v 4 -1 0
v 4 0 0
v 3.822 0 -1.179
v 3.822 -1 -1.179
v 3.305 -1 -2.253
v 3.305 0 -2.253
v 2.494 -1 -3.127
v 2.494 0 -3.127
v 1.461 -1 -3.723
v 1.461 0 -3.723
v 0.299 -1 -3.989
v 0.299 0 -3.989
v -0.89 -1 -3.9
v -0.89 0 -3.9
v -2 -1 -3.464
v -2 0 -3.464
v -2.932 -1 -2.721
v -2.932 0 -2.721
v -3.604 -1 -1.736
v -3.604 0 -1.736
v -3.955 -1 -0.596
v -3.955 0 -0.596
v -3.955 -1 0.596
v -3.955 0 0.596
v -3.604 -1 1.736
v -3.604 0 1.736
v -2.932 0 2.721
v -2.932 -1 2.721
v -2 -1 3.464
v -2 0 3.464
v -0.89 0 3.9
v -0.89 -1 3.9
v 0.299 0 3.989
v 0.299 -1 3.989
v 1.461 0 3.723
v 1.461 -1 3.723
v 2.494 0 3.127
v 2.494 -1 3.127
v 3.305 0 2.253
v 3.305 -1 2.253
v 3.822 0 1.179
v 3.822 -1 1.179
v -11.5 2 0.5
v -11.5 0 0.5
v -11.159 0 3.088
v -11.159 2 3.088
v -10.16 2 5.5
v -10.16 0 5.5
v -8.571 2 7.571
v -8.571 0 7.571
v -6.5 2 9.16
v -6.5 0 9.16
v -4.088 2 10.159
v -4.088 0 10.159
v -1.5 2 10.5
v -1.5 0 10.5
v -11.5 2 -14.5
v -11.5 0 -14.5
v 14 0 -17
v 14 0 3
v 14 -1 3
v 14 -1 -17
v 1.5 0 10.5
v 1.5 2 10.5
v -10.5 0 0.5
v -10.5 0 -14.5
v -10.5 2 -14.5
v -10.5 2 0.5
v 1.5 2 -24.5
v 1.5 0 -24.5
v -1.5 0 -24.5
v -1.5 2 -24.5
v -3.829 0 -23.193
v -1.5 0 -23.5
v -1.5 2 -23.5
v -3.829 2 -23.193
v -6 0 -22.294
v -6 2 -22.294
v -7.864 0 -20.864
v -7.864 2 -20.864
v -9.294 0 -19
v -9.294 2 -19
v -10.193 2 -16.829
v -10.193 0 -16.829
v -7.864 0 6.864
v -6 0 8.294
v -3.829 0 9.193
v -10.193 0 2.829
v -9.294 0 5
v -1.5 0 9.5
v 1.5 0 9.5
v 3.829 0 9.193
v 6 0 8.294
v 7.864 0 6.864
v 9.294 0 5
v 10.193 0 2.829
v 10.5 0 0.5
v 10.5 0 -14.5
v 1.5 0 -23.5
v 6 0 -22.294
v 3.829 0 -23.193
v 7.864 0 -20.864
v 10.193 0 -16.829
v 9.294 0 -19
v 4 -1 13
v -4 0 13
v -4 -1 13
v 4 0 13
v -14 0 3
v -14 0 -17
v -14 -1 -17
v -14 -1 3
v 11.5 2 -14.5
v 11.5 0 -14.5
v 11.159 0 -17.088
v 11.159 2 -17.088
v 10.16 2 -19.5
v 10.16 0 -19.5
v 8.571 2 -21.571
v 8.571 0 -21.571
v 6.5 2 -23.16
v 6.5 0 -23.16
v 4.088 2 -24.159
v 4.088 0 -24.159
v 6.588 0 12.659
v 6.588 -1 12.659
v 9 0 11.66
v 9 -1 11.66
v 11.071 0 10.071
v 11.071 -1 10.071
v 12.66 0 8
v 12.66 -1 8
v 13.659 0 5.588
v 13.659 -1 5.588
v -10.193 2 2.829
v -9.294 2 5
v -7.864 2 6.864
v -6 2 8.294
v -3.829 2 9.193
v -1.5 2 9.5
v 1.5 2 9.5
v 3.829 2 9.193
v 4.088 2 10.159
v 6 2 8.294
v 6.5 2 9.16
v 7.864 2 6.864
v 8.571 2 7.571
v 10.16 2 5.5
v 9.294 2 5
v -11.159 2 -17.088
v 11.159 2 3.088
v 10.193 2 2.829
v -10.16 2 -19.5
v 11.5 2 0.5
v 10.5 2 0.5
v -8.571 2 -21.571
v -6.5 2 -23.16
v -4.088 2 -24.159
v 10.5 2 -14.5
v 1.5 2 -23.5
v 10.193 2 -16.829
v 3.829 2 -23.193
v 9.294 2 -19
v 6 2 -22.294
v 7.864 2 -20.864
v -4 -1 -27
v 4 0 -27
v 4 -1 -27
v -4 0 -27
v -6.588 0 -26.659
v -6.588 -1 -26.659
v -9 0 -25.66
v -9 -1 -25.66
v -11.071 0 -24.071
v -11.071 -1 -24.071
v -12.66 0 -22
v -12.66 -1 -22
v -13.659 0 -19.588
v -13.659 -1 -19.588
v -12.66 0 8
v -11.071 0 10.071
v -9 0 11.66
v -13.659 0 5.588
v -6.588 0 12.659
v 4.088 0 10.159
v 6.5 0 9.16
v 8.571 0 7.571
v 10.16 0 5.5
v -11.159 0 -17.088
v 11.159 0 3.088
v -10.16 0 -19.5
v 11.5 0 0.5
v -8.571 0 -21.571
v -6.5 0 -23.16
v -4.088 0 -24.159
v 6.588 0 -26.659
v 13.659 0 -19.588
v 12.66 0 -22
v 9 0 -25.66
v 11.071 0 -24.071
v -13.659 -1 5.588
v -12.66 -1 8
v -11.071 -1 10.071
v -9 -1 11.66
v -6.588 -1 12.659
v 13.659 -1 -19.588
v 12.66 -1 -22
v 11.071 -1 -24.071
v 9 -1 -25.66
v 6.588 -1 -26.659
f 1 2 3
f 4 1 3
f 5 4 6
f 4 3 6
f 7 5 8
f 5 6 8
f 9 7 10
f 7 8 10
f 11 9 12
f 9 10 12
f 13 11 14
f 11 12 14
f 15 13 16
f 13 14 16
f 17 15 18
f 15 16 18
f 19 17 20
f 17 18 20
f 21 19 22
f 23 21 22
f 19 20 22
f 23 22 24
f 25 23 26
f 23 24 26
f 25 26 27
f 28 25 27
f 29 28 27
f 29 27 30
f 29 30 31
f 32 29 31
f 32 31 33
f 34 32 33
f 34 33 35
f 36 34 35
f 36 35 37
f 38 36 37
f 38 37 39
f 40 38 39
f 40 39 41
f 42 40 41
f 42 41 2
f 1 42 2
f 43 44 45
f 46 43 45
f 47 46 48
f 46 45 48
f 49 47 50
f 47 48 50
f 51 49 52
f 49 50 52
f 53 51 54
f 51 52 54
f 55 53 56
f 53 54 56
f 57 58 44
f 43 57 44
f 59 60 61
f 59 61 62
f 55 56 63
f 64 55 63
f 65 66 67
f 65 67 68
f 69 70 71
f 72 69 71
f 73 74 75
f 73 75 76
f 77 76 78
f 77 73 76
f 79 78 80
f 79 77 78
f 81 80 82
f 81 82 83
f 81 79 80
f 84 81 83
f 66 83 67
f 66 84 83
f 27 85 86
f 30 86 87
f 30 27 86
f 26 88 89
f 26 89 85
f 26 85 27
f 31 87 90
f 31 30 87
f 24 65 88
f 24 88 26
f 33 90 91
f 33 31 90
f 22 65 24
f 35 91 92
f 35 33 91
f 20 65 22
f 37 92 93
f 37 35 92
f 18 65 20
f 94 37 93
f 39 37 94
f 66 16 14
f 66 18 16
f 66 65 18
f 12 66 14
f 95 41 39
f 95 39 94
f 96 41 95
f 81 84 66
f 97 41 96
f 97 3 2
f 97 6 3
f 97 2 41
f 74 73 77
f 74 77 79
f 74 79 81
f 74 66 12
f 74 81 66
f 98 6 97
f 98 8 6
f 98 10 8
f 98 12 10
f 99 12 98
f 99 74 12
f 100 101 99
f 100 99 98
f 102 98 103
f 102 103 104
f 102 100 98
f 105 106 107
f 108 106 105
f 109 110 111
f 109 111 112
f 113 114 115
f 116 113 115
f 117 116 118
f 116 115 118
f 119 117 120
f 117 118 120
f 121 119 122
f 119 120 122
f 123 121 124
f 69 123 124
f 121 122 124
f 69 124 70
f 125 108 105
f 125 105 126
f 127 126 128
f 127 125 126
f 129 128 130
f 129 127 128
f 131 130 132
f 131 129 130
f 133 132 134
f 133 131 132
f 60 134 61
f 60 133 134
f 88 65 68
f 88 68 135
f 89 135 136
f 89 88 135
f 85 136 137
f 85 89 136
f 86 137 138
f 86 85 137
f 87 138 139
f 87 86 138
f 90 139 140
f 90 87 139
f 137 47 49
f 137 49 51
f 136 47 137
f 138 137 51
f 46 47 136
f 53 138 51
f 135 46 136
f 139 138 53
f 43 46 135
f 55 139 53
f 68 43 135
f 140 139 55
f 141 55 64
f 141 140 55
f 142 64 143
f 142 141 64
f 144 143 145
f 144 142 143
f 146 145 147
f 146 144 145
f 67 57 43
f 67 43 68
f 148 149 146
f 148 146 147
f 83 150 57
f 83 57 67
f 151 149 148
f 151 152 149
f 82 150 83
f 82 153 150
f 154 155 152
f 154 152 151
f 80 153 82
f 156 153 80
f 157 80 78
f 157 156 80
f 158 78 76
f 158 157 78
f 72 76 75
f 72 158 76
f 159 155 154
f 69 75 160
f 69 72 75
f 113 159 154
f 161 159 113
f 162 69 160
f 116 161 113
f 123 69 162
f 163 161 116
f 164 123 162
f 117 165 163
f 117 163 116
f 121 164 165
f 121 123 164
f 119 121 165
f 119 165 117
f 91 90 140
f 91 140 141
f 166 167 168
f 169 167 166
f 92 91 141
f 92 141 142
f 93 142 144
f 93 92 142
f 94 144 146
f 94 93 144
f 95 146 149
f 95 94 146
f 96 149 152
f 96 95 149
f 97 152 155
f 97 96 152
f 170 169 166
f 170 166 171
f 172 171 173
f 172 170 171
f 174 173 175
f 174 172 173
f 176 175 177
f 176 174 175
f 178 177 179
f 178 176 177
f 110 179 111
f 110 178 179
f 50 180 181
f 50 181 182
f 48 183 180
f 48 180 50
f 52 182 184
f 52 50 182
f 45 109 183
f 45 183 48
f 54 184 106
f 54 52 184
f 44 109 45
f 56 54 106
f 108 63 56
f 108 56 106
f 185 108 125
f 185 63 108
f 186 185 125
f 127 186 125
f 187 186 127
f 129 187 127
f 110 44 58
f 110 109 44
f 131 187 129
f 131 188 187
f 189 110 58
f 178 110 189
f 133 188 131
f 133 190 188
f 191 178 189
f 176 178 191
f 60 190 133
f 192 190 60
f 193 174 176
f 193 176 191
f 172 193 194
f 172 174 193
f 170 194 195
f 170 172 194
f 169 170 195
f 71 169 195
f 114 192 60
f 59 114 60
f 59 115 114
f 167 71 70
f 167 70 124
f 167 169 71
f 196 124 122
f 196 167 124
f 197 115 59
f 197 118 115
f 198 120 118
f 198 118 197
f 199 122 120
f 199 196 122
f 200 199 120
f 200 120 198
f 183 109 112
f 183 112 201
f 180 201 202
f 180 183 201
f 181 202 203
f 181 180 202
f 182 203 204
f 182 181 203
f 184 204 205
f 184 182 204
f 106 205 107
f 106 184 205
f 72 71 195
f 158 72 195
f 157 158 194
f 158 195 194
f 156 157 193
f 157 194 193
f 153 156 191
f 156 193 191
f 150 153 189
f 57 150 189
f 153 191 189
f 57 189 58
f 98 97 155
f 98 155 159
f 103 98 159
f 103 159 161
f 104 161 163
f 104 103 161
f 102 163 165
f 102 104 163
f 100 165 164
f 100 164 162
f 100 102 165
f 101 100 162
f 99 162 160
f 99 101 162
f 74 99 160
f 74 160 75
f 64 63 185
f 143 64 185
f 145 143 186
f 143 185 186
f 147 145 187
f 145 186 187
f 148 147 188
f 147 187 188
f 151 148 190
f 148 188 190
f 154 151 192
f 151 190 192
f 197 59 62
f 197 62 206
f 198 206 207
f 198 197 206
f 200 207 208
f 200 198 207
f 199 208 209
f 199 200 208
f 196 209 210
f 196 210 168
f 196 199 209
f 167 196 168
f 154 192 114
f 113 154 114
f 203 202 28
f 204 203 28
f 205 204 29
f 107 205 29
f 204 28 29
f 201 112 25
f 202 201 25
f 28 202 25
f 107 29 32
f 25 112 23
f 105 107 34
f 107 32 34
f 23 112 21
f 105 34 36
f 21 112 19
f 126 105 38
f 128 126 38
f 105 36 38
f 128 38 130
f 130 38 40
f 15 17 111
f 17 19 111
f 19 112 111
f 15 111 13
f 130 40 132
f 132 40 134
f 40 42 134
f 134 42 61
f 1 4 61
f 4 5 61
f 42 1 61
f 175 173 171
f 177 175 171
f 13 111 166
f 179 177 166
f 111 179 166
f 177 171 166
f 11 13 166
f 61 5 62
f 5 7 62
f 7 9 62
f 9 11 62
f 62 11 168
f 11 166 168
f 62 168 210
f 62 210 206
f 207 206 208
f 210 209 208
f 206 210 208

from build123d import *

# Parameters (mm, degrees)
BOSS_EXTRUDE1_DEPTH     = 2
BOSS_EXTRUDE3_DEPTH     = 1
SKETCH2_R               = 4
CUT_EXTRUDE1_DEPTH      = 3
CUT_EXTRUDE1_DEPTH_BACK = 2


with BuildPart() as part:
    # Sketch1 → Boss-Extrude1 (new body)
    with BuildSketch(Plane(origin=(0, 0, 0), x_dir=(1, 0, 0), z_dir=(0, 1, 0))):
        with BuildLine():
            Line((-11.5, 14.5), (-11.5, -0.5))
            ThreePointArc((-11.5, -0.5), (-8.571067812, -7.571067812), (-1.5, -10.5))
            Line((-1.5, -10.5), (1.5, -10.5))
            ThreePointArc((1.5, -10.5), (8.571067812, -7.571067812), (11.5, -0.5))
            Line((11.5, -0.5), (11.5, 14.5))
            ThreePointArc((11.5, 14.5), (8.571067812, 21.571067812), (1.5, 24.5))
            Line((1.5, 24.5), (-1.5, 24.5))
            ThreePointArc((-1.5, 24.5), (-8.571067812, 21.571067812), (-11.5, 14.5))
        make_face()
        with BuildLine():
            ThreePointArc((-1.5, 23.5), (-7.863961031, 20.863961031), (-10.5, 14.5))
            Line((-10.5, 14.5), (-10.5, -0.5))
            ThreePointArc((-10.5, -0.5), (-7.863961031, -6.863961031), (-1.5, -9.5))
            Line((-1.5, -9.5), (1.5, -9.5))
            ThreePointArc((1.5, -9.5), (7.863961031, -6.863961031), (10.5, -0.5))
            Line((10.5, -0.5), (10.5, 14.5))
            ThreePointArc((10.5, 14.5), (7.863961031, 20.863961031), (1.5, 23.5))
            Line((1.5, 23.5), (-1.5, 23.5))
        make_face(mode=Mode.SUBTRACT)
    extrude(amount=BOSS_EXTRUDE1_DEPTH)

    # Sketch1<4> → Boss-Extrude3 (add)
    with BuildSketch(Plane(origin=(0, 0, 0), x_dir=(1, 0, 0), z_dir=(0, 1, 0))):
        with BuildLine():
            Line((4, 27), (-4, 27))
            ThreePointArc((-4, 27), (-11.071067812, 24.071067812), (-14, 17))
            Line((-14, 17), (-14, -3))
            ThreePointArc((-14, -3), (-11.071067812, -10.071067812), (-4, -13))
            Line((-4, -13), (4, -13))
            ThreePointArc((4, -13), (11.071067812, -10.071067812), (14, -3))
            Line((14, -3), (14, 17))
            ThreePointArc((14, 17), (11.071067812, 24.071067812), (4, 27))
        make_face()
    extrude(amount=-BOSS_EXTRUDE3_DEPTH)

    # Sketch2 → Cut-Extrude1 (cut, two sides)
    with BuildSketch(Plane(origin=(0, 0, 0), x_dir=(1, 0, 0), z_dir=(0, 1, 0))) as cut_extrude1_sk:
        Circle(SKETCH2_R)
    extrude(amount=CUT_EXTRUDE1_DEPTH, mode=Mode.SUBTRACT)
    extrude(cut_extrude1_sk.sketch, amount=-CUT_EXTRUDE1_DEPTH_BACK, mode=Mode.SUBTRACT)


solid = part.part
